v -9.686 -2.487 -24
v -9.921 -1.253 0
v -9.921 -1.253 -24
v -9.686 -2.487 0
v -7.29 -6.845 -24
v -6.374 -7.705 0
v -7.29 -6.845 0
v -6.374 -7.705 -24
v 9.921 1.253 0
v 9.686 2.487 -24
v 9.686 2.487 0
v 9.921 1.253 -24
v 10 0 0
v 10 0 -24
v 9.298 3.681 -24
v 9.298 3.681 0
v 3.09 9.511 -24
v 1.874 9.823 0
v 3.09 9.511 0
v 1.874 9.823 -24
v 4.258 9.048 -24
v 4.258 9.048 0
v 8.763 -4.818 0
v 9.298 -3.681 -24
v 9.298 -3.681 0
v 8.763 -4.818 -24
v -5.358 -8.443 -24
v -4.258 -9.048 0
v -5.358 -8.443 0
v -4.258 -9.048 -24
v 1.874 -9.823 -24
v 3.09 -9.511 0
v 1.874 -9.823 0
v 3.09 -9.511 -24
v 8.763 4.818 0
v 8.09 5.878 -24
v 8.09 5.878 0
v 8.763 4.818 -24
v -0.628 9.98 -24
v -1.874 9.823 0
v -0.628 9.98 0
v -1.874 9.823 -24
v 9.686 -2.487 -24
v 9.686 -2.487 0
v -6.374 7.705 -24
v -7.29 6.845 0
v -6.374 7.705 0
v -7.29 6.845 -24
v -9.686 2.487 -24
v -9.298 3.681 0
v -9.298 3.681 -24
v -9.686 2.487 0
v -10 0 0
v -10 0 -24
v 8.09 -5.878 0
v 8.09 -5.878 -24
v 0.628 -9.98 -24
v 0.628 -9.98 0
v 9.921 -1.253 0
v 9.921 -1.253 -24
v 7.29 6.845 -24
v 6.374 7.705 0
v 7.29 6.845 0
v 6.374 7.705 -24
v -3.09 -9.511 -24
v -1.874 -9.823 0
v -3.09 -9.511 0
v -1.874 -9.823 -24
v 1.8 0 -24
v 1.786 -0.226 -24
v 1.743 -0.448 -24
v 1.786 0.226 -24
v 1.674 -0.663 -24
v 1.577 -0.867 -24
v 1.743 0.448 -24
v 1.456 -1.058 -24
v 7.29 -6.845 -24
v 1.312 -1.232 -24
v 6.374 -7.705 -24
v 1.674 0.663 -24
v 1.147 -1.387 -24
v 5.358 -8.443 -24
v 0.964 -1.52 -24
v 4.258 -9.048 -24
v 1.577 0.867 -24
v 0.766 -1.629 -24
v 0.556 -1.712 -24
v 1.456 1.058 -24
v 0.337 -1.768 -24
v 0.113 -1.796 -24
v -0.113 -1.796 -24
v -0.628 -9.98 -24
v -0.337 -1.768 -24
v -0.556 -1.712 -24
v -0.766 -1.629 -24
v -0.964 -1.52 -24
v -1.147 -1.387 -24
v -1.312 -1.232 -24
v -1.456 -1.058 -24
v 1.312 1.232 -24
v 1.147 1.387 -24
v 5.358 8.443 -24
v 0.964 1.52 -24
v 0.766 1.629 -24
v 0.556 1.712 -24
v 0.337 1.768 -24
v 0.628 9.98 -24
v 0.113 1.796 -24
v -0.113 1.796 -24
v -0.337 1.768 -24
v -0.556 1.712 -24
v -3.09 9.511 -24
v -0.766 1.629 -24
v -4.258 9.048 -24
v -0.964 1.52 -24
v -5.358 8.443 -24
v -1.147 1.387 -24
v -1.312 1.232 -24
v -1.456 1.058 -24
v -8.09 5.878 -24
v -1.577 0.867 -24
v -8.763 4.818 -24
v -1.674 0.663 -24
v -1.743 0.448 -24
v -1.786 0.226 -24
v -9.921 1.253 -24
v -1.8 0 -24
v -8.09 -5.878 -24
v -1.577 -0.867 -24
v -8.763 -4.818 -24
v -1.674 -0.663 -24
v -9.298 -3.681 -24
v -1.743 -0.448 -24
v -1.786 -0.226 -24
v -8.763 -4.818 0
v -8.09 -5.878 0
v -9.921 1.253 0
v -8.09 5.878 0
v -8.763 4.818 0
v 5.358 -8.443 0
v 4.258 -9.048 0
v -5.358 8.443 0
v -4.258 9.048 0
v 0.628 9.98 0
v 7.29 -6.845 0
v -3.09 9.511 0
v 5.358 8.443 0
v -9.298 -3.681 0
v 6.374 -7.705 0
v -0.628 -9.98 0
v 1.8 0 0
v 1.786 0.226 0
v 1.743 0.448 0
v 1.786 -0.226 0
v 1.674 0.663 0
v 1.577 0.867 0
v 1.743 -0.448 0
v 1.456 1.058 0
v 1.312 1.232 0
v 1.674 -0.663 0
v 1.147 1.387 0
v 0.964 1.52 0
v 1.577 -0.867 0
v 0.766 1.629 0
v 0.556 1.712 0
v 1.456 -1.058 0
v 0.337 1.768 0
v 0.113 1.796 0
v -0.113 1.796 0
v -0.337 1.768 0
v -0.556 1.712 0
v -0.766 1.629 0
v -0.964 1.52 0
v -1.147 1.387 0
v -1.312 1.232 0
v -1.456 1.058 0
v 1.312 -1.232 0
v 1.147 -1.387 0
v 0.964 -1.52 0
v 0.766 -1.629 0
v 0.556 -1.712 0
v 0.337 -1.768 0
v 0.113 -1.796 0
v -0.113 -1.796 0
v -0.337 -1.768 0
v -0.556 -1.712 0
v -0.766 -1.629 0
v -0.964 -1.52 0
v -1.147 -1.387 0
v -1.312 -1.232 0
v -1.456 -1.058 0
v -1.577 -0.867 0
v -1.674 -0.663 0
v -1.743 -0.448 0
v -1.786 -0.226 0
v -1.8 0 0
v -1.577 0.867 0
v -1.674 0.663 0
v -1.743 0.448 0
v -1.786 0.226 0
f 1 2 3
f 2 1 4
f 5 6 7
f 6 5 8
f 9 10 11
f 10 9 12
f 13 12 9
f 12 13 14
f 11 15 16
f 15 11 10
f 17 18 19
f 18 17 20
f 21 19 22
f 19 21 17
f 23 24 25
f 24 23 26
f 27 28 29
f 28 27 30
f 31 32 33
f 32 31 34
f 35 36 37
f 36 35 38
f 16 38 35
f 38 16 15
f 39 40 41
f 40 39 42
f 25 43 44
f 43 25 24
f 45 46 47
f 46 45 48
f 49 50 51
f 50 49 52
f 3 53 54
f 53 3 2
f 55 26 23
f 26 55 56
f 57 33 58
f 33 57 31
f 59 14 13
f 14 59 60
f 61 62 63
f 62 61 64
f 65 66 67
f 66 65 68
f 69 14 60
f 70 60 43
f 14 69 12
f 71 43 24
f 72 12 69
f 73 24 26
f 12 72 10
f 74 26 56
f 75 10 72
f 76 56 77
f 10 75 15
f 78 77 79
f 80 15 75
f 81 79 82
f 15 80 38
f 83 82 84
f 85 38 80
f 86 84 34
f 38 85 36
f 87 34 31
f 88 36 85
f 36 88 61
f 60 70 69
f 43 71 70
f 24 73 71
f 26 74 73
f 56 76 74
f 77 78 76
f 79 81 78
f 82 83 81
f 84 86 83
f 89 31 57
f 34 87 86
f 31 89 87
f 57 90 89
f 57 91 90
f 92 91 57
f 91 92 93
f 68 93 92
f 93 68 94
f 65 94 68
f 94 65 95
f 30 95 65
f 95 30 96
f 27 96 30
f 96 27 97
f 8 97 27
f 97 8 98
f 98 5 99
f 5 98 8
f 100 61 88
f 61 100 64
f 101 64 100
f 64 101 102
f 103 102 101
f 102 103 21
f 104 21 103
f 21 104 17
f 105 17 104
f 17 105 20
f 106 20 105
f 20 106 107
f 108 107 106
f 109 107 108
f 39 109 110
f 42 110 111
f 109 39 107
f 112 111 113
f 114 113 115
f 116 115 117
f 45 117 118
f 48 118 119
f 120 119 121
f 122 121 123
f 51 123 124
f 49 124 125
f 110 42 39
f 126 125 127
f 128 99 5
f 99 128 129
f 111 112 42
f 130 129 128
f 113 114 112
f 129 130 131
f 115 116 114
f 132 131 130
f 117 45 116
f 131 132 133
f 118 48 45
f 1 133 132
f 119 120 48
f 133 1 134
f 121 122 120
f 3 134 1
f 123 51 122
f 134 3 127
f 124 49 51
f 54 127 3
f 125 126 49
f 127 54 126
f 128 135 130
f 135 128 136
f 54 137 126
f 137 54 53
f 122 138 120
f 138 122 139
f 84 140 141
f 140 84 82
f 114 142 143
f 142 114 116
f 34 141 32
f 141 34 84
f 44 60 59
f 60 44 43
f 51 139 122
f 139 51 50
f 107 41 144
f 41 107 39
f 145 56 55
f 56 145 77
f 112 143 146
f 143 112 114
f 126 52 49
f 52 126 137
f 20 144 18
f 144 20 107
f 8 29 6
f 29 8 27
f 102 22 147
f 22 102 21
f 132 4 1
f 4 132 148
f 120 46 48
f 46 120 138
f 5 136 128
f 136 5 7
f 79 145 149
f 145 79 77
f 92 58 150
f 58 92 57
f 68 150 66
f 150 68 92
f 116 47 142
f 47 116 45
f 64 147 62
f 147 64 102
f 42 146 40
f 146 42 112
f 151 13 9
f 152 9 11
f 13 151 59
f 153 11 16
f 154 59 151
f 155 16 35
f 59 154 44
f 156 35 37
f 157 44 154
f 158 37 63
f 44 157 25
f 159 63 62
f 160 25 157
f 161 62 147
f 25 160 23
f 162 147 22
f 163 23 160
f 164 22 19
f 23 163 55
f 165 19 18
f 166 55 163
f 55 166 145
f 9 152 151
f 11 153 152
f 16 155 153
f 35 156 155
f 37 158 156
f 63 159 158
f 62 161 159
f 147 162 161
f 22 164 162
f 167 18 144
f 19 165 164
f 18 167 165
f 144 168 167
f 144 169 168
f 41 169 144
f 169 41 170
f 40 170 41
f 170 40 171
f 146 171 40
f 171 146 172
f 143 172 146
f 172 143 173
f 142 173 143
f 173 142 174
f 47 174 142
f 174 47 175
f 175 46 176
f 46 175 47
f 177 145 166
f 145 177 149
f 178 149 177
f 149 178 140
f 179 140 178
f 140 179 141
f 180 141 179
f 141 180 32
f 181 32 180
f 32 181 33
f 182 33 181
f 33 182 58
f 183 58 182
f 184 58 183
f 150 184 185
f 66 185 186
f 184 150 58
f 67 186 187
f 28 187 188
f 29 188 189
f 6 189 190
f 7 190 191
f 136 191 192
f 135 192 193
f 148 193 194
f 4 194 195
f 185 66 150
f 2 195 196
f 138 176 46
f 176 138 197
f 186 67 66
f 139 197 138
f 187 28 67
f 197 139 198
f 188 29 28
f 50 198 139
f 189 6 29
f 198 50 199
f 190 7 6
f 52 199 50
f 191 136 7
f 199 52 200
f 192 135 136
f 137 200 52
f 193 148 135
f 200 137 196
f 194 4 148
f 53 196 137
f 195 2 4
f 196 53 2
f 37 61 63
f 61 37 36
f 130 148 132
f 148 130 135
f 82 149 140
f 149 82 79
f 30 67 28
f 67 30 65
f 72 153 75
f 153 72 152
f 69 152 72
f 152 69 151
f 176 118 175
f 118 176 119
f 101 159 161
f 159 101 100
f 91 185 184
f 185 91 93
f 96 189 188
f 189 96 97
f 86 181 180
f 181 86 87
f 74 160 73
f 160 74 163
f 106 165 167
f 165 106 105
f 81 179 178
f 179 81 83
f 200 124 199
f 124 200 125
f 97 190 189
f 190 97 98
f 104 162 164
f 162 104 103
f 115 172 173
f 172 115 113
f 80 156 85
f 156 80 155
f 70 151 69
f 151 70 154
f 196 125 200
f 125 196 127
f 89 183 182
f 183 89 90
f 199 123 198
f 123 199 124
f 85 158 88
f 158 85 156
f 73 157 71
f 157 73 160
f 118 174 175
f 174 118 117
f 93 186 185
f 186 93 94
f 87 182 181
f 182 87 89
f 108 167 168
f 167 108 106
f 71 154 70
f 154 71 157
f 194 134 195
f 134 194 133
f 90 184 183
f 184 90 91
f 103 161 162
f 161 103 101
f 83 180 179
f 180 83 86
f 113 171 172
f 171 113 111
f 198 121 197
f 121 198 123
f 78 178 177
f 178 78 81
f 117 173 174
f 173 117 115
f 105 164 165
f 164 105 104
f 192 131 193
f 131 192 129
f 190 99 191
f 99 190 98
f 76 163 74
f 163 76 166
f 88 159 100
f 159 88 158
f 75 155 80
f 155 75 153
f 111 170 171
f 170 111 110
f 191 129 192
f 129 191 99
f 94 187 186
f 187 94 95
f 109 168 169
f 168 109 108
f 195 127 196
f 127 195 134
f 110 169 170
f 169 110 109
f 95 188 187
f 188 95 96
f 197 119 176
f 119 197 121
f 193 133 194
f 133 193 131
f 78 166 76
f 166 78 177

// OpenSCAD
$fn = 50;


difference() {
	union() {
		translate(v = [0, 0, -24.0000000000]) {
			cylinder(h = 24, r = 10.0000000000);
		}
	}
	union() {
		#translate(v = [0, 0, -24]) {
			cylinder(h = 24, r = 1.8000000000);
		}
	}
}
